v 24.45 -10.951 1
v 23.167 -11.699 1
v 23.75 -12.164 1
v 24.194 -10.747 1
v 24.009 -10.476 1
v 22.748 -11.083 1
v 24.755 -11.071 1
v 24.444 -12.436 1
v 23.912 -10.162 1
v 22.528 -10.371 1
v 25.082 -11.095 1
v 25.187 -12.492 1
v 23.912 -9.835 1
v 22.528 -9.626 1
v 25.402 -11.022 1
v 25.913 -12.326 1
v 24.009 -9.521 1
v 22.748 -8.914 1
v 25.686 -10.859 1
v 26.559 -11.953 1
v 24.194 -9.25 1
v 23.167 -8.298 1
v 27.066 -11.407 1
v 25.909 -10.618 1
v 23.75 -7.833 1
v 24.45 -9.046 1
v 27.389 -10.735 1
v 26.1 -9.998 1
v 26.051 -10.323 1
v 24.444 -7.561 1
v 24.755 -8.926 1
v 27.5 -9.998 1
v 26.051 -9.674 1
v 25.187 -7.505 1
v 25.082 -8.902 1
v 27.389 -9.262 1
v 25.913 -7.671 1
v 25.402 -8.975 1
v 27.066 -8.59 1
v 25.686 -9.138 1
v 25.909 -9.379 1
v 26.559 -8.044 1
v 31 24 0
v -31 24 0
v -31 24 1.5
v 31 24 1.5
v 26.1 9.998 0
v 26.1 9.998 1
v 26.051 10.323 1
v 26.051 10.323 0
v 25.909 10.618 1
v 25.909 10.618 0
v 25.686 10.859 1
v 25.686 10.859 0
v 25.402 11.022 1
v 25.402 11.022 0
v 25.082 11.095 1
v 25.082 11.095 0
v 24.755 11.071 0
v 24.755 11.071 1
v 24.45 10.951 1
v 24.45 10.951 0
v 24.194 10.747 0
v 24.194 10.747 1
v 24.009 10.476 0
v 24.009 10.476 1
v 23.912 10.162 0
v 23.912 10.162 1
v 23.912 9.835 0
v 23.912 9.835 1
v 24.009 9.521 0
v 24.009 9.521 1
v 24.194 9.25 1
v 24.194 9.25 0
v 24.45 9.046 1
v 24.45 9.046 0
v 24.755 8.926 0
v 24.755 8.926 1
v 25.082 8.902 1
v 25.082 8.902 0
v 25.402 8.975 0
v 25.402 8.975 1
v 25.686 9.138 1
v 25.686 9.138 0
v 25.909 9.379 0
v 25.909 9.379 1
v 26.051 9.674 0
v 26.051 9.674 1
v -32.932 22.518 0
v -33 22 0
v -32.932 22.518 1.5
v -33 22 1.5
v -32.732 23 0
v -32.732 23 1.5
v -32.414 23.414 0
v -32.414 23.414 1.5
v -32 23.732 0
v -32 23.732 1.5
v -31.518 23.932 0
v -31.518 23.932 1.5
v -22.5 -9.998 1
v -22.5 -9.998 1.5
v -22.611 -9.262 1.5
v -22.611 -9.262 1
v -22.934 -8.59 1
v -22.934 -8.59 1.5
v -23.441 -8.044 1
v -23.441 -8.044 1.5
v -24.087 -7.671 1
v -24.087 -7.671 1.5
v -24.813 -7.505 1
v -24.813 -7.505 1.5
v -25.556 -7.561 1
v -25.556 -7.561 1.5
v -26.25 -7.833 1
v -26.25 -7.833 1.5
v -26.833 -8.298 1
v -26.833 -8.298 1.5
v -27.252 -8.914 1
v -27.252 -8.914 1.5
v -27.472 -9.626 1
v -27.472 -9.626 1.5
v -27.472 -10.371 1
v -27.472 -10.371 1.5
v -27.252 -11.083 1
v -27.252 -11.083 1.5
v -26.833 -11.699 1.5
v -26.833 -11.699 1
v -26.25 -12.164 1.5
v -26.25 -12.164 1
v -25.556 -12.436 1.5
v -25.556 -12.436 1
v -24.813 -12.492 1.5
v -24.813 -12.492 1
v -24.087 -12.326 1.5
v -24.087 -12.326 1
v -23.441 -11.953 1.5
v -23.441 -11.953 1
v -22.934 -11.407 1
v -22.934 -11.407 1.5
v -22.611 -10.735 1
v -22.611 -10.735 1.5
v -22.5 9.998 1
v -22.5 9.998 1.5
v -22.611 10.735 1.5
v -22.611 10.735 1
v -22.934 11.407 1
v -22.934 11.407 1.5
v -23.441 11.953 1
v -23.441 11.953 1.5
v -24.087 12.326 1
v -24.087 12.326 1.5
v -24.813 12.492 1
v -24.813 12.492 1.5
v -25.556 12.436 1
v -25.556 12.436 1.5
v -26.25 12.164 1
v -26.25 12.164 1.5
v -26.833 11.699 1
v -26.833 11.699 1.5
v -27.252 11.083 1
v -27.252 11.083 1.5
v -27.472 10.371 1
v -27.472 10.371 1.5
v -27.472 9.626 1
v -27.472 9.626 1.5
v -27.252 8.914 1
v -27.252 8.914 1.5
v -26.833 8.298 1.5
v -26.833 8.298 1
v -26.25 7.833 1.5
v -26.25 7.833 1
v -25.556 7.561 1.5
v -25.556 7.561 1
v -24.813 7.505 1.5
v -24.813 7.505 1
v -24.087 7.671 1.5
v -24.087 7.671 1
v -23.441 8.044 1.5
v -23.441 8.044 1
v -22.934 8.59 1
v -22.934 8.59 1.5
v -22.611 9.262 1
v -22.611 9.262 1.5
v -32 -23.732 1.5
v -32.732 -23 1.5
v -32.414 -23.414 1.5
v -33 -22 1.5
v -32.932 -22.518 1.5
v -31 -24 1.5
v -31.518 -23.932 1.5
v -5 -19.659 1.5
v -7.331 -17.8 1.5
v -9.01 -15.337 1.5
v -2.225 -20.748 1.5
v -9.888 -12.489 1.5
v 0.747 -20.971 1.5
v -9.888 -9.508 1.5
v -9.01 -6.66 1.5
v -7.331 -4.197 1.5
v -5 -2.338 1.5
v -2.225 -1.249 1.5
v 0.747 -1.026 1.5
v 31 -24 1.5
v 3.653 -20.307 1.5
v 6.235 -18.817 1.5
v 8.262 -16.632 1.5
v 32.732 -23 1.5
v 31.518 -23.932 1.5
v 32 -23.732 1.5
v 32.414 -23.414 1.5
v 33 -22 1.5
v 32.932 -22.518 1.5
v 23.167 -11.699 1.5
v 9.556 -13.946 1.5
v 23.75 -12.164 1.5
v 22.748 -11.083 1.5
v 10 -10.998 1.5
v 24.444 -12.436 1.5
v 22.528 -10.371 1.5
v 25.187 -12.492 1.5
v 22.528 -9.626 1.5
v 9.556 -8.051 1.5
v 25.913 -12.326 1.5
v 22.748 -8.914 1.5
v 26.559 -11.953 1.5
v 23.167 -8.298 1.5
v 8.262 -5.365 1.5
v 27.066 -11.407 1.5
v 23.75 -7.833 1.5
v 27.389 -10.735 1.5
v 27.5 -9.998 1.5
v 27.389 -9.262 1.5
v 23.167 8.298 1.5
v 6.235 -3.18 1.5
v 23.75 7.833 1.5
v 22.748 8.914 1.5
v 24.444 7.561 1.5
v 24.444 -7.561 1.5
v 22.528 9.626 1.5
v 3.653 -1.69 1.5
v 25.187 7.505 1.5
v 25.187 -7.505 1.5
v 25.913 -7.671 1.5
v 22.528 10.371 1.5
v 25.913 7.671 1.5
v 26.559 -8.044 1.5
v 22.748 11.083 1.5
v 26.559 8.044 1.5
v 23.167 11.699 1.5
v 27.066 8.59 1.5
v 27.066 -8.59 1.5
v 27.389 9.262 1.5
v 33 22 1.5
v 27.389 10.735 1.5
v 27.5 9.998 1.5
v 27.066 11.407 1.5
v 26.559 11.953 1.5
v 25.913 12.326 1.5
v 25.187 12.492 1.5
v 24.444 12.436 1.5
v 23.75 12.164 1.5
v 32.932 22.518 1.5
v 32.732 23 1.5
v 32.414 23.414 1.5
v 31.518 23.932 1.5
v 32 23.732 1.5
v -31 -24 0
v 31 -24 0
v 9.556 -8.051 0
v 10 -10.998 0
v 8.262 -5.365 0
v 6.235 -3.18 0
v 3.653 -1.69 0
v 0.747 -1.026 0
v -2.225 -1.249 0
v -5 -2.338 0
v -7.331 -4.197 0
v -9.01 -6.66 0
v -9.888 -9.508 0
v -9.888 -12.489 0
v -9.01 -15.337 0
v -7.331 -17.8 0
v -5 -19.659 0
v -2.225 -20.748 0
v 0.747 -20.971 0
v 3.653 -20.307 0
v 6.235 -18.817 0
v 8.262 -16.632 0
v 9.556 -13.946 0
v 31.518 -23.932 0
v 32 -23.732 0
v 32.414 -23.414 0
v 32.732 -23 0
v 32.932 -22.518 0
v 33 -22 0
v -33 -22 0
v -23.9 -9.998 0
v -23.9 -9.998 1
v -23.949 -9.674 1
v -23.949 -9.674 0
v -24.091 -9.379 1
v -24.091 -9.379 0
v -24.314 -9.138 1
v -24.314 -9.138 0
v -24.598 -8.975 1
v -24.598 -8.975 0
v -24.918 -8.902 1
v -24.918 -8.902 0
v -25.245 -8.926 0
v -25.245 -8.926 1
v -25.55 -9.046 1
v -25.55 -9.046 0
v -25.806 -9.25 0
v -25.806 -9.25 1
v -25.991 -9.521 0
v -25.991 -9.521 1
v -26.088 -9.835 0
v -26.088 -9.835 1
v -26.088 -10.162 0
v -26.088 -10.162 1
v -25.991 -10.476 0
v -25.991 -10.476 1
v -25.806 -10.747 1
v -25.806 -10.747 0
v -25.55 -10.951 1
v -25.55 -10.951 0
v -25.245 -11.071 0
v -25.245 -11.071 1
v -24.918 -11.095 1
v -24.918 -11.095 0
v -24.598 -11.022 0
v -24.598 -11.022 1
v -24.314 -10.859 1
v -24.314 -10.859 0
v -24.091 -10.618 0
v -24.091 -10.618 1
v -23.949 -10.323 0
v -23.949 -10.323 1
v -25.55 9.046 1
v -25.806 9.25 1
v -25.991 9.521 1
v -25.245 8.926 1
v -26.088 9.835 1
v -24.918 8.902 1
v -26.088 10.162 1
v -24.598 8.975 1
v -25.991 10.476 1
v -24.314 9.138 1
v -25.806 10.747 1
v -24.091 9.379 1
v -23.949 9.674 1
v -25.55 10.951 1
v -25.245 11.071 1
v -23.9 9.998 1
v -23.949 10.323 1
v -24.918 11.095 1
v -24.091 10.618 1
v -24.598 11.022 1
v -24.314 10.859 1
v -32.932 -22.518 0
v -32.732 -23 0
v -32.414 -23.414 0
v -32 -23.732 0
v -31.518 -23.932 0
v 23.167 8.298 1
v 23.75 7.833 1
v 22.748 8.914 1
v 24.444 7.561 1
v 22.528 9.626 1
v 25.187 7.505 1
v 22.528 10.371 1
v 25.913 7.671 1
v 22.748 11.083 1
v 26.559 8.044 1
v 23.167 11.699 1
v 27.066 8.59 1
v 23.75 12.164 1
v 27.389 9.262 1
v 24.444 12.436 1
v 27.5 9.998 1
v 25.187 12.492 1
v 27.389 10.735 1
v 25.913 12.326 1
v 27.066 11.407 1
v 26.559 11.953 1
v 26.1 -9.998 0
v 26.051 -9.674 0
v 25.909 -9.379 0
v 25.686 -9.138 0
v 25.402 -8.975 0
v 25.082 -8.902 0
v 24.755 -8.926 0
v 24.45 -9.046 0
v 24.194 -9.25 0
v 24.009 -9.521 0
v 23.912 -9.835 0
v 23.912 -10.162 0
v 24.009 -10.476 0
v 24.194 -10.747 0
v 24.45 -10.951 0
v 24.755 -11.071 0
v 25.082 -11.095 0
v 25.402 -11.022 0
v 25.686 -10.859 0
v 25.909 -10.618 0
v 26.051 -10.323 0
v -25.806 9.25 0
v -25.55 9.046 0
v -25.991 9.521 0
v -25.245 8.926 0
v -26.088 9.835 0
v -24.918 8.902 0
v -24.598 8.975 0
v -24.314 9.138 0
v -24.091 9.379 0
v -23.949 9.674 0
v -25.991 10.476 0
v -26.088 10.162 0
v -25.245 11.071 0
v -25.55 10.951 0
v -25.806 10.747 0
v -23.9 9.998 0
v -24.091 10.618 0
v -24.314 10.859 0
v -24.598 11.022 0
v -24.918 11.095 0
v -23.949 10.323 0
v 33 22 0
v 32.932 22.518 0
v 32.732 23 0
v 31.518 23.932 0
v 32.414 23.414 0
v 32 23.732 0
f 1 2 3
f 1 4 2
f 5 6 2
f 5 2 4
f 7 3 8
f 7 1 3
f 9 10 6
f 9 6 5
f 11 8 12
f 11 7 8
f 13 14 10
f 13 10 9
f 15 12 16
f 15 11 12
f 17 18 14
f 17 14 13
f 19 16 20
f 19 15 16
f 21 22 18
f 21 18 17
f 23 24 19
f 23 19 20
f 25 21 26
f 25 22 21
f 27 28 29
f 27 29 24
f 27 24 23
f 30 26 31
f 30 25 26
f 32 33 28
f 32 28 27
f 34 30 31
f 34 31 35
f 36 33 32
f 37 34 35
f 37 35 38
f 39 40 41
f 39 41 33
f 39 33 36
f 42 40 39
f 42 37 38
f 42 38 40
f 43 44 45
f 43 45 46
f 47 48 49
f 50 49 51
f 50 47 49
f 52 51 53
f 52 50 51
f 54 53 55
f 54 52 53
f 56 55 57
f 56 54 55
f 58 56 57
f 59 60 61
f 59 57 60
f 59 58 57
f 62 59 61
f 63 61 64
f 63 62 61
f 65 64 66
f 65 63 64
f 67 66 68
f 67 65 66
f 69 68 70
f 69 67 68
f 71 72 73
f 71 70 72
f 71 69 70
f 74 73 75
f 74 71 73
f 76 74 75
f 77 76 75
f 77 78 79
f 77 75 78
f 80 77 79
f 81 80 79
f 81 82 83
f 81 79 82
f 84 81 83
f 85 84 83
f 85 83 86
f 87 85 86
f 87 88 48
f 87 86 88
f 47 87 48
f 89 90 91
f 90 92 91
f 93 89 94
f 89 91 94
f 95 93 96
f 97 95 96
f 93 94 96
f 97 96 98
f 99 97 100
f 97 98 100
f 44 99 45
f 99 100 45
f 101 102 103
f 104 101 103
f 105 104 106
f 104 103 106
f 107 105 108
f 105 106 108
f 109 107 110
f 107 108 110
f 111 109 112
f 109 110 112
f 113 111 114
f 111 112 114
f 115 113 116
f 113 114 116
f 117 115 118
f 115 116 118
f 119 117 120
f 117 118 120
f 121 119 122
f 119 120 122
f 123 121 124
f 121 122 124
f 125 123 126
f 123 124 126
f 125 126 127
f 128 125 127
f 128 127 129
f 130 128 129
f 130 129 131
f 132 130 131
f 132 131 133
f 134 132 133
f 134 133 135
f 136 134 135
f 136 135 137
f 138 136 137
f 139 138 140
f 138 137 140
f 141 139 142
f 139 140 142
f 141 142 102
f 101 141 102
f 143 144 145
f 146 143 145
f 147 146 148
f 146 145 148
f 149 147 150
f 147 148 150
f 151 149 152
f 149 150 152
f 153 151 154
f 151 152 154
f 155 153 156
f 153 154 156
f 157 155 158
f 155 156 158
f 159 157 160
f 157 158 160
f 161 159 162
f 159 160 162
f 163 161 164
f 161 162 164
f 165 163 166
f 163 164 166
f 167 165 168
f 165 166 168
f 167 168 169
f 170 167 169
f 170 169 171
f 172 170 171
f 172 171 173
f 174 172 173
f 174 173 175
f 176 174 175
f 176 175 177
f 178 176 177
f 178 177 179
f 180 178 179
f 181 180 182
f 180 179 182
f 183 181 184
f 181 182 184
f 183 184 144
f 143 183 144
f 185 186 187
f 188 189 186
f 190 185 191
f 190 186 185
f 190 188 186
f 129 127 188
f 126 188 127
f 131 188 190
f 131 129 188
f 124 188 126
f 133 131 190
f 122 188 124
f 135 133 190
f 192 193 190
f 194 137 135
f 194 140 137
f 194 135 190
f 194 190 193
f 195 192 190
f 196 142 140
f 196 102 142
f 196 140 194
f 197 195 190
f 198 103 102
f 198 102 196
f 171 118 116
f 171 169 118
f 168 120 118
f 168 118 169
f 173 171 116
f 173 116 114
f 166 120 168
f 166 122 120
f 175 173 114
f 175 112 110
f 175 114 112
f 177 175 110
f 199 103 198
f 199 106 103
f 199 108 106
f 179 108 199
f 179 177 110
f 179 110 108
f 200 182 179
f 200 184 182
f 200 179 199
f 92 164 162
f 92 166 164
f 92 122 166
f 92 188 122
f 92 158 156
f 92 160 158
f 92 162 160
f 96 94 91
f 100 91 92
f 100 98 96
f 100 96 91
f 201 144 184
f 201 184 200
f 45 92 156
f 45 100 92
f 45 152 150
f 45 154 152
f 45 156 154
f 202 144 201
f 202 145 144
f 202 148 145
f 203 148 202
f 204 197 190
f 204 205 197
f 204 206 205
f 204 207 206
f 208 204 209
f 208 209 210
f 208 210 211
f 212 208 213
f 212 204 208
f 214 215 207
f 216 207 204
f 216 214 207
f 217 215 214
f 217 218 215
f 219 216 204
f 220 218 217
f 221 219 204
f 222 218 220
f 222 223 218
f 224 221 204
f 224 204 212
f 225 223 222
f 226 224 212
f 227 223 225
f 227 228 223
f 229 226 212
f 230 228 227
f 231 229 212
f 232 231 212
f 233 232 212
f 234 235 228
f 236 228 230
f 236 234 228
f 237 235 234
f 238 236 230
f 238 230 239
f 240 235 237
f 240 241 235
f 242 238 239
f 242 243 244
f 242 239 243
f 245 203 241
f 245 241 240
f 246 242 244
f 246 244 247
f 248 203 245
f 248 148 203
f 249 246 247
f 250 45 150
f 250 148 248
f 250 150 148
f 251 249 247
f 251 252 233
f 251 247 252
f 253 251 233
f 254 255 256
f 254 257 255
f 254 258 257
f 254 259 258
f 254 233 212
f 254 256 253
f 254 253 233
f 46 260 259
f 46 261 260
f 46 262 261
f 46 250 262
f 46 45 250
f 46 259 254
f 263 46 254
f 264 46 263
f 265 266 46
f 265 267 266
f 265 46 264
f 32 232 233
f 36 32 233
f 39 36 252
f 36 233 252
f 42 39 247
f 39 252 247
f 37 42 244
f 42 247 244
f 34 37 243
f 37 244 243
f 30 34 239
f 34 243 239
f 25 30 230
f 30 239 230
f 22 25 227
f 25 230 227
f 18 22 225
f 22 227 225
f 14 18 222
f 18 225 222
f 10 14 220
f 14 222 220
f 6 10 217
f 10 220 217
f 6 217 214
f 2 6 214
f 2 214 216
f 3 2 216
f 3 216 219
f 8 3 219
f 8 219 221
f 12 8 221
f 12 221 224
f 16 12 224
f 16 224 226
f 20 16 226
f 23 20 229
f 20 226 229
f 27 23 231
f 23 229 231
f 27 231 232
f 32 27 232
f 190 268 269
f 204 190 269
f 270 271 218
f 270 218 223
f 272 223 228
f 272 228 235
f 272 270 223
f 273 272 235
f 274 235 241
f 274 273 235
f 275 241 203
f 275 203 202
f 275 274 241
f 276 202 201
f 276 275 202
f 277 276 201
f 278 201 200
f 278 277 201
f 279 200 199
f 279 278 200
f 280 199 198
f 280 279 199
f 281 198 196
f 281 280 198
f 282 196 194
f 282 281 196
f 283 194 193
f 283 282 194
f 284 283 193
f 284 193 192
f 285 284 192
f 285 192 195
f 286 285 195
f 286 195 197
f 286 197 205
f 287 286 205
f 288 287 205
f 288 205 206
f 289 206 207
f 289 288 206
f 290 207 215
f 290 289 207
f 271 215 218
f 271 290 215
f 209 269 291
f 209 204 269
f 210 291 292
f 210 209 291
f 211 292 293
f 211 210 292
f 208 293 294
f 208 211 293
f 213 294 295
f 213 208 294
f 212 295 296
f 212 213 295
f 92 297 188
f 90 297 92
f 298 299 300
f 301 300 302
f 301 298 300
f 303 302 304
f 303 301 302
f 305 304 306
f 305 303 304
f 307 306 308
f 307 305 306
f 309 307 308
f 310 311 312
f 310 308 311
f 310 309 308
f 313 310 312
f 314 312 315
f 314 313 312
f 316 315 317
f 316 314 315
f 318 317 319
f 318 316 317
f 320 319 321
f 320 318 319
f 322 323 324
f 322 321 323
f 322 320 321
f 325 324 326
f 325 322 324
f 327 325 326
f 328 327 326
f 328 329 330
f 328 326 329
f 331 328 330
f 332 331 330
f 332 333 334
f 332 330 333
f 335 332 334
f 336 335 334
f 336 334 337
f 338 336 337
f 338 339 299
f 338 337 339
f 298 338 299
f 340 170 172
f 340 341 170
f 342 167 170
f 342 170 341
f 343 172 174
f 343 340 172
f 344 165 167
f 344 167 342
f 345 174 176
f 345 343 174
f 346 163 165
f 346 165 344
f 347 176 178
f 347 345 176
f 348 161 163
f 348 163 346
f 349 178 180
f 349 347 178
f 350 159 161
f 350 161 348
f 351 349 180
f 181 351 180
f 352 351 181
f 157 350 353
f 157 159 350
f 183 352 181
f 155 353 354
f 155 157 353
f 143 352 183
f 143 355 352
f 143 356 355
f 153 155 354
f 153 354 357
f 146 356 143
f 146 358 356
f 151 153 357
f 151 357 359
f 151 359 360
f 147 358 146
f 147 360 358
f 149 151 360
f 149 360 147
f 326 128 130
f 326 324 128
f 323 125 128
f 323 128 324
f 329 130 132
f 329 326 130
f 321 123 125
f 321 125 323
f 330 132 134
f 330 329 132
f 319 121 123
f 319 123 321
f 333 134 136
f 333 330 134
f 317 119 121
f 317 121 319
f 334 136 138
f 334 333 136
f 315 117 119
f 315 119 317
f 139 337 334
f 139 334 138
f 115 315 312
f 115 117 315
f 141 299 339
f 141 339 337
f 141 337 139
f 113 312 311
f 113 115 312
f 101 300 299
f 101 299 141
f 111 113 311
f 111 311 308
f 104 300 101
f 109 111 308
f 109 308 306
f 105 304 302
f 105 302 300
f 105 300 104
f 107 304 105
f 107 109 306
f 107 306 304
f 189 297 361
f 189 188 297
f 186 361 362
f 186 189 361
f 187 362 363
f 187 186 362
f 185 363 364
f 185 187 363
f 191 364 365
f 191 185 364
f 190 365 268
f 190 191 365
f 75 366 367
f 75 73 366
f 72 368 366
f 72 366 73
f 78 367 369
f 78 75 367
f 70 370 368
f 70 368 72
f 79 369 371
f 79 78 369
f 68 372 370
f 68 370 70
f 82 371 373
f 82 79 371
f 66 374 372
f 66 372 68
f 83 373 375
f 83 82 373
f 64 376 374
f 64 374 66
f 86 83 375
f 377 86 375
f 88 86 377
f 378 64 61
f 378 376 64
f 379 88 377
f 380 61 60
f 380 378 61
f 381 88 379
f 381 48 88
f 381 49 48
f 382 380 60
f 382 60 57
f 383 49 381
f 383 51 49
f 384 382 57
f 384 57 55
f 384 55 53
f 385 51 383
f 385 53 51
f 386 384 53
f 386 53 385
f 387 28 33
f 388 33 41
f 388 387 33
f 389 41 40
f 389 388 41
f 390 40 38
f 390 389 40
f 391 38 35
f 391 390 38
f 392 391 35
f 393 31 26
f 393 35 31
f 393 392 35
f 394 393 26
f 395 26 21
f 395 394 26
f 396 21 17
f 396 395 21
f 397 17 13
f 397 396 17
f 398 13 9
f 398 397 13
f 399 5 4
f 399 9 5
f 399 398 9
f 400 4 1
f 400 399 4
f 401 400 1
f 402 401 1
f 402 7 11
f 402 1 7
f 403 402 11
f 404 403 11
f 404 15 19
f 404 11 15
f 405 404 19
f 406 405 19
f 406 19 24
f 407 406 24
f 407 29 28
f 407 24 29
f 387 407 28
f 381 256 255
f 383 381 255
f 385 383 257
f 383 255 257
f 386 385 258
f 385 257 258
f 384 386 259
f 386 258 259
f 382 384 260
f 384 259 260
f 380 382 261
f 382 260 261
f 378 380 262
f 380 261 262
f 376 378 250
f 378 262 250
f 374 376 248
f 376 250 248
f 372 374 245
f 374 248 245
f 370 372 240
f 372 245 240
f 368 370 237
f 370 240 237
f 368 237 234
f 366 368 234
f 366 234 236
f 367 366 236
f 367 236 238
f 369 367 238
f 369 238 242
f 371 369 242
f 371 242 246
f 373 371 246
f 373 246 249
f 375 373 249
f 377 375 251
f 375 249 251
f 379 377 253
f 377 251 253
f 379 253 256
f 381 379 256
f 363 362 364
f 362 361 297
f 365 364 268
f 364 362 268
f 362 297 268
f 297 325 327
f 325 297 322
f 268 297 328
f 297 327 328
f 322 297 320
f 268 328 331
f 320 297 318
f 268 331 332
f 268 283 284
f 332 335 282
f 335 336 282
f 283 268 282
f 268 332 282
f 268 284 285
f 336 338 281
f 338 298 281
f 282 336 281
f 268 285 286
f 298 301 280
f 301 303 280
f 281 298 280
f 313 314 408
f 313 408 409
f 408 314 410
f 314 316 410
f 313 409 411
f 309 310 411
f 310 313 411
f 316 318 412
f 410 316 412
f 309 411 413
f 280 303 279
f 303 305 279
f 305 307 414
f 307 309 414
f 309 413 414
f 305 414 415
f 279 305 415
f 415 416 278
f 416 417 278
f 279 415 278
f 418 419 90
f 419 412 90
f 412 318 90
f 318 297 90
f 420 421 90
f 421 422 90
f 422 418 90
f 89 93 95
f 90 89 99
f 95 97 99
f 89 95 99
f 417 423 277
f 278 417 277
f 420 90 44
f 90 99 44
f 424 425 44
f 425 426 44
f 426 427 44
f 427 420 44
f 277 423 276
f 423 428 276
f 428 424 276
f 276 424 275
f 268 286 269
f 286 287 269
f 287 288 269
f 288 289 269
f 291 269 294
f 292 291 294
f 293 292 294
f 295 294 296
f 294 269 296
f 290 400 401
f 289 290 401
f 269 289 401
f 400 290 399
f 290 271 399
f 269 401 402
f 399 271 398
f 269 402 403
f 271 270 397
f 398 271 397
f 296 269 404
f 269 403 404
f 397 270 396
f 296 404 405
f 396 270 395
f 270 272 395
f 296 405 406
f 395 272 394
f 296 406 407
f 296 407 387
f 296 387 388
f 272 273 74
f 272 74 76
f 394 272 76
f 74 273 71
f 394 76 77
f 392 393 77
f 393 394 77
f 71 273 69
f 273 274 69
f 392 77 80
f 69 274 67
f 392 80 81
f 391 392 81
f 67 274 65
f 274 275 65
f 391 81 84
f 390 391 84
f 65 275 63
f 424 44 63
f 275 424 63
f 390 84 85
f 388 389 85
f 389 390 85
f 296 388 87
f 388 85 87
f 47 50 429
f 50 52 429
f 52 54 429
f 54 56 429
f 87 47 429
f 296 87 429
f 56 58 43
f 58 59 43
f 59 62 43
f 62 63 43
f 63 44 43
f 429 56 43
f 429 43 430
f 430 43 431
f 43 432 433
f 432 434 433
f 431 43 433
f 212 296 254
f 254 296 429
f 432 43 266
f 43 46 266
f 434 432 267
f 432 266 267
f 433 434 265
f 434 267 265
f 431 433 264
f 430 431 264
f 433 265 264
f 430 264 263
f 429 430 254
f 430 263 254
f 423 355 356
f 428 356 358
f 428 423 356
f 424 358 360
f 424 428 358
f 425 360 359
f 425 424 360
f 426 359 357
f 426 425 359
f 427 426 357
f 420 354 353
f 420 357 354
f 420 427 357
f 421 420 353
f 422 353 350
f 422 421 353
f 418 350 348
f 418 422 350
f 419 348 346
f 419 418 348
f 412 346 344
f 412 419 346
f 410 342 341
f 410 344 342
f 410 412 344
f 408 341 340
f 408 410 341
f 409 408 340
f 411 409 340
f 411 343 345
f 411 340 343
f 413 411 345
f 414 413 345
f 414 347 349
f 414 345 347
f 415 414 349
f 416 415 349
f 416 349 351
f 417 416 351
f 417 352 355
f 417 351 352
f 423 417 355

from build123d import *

# Parameters (mm, degrees)
F0_W     = 66
F0_H     = 48
F0_R     = 1.1
F0_R_2   = 10
F1_DEPTH = 1.5
F2_R     = 2
F3_R     = 2.5
F4_DEPTH = 0.5


with BuildPart() as f1:
    # F0 (on Top) → F1 (new body)
    with BuildSketch(Plane.XY):
        Rectangle(F0_W, F0_H)
        with Locations((-25, -9.9985)):
            Circle(F0_R, mode=Mode.SUBTRACT)
        with Locations((0, -10.9985)):
            Circle(F0_R_2, mode=Mode.SUBTRACT)
        with Locations((25, -9.9985)):
            Circle(F0_R, mode=Mode.SUBTRACT)
        with Locations((-25, 9.9985)):
            Circle(F0_R, mode=Mode.SUBTRACT)
        with Locations((25, 9.9985)):
            Circle(F0_R, mode=Mode.SUBTRACT)
    extrude(amount=F1_DEPTH)

    # F2
    f2_edges = [f1.edges().sort_by_distance(p)[0] for p in [
        (-33, -24, 0.75),
        (33, -24, 0.75),
        (-33, 24, 0.75),
        (33, 24, 0.75),
    ]]
    fillet(f2_edges, radius=F2_R)

    # F3 (on face) → F4 (cut)
    with BuildSketch(Plane.XY.offset(1.5)):
        with Locations((-25, 9.9985)):
            Circle(F3_R)
        with Locations((25, 9.9985)):
            Circle(F3_R)
        with Locations((-25, -9.9985)):
            Circle(F3_R)
        with Locations((25, -9.9985)):
            Circle(F3_R)
    extrude(amount=-F4_DEPTH, mode=Mode.SUBTRACT)


solid = f1.part
